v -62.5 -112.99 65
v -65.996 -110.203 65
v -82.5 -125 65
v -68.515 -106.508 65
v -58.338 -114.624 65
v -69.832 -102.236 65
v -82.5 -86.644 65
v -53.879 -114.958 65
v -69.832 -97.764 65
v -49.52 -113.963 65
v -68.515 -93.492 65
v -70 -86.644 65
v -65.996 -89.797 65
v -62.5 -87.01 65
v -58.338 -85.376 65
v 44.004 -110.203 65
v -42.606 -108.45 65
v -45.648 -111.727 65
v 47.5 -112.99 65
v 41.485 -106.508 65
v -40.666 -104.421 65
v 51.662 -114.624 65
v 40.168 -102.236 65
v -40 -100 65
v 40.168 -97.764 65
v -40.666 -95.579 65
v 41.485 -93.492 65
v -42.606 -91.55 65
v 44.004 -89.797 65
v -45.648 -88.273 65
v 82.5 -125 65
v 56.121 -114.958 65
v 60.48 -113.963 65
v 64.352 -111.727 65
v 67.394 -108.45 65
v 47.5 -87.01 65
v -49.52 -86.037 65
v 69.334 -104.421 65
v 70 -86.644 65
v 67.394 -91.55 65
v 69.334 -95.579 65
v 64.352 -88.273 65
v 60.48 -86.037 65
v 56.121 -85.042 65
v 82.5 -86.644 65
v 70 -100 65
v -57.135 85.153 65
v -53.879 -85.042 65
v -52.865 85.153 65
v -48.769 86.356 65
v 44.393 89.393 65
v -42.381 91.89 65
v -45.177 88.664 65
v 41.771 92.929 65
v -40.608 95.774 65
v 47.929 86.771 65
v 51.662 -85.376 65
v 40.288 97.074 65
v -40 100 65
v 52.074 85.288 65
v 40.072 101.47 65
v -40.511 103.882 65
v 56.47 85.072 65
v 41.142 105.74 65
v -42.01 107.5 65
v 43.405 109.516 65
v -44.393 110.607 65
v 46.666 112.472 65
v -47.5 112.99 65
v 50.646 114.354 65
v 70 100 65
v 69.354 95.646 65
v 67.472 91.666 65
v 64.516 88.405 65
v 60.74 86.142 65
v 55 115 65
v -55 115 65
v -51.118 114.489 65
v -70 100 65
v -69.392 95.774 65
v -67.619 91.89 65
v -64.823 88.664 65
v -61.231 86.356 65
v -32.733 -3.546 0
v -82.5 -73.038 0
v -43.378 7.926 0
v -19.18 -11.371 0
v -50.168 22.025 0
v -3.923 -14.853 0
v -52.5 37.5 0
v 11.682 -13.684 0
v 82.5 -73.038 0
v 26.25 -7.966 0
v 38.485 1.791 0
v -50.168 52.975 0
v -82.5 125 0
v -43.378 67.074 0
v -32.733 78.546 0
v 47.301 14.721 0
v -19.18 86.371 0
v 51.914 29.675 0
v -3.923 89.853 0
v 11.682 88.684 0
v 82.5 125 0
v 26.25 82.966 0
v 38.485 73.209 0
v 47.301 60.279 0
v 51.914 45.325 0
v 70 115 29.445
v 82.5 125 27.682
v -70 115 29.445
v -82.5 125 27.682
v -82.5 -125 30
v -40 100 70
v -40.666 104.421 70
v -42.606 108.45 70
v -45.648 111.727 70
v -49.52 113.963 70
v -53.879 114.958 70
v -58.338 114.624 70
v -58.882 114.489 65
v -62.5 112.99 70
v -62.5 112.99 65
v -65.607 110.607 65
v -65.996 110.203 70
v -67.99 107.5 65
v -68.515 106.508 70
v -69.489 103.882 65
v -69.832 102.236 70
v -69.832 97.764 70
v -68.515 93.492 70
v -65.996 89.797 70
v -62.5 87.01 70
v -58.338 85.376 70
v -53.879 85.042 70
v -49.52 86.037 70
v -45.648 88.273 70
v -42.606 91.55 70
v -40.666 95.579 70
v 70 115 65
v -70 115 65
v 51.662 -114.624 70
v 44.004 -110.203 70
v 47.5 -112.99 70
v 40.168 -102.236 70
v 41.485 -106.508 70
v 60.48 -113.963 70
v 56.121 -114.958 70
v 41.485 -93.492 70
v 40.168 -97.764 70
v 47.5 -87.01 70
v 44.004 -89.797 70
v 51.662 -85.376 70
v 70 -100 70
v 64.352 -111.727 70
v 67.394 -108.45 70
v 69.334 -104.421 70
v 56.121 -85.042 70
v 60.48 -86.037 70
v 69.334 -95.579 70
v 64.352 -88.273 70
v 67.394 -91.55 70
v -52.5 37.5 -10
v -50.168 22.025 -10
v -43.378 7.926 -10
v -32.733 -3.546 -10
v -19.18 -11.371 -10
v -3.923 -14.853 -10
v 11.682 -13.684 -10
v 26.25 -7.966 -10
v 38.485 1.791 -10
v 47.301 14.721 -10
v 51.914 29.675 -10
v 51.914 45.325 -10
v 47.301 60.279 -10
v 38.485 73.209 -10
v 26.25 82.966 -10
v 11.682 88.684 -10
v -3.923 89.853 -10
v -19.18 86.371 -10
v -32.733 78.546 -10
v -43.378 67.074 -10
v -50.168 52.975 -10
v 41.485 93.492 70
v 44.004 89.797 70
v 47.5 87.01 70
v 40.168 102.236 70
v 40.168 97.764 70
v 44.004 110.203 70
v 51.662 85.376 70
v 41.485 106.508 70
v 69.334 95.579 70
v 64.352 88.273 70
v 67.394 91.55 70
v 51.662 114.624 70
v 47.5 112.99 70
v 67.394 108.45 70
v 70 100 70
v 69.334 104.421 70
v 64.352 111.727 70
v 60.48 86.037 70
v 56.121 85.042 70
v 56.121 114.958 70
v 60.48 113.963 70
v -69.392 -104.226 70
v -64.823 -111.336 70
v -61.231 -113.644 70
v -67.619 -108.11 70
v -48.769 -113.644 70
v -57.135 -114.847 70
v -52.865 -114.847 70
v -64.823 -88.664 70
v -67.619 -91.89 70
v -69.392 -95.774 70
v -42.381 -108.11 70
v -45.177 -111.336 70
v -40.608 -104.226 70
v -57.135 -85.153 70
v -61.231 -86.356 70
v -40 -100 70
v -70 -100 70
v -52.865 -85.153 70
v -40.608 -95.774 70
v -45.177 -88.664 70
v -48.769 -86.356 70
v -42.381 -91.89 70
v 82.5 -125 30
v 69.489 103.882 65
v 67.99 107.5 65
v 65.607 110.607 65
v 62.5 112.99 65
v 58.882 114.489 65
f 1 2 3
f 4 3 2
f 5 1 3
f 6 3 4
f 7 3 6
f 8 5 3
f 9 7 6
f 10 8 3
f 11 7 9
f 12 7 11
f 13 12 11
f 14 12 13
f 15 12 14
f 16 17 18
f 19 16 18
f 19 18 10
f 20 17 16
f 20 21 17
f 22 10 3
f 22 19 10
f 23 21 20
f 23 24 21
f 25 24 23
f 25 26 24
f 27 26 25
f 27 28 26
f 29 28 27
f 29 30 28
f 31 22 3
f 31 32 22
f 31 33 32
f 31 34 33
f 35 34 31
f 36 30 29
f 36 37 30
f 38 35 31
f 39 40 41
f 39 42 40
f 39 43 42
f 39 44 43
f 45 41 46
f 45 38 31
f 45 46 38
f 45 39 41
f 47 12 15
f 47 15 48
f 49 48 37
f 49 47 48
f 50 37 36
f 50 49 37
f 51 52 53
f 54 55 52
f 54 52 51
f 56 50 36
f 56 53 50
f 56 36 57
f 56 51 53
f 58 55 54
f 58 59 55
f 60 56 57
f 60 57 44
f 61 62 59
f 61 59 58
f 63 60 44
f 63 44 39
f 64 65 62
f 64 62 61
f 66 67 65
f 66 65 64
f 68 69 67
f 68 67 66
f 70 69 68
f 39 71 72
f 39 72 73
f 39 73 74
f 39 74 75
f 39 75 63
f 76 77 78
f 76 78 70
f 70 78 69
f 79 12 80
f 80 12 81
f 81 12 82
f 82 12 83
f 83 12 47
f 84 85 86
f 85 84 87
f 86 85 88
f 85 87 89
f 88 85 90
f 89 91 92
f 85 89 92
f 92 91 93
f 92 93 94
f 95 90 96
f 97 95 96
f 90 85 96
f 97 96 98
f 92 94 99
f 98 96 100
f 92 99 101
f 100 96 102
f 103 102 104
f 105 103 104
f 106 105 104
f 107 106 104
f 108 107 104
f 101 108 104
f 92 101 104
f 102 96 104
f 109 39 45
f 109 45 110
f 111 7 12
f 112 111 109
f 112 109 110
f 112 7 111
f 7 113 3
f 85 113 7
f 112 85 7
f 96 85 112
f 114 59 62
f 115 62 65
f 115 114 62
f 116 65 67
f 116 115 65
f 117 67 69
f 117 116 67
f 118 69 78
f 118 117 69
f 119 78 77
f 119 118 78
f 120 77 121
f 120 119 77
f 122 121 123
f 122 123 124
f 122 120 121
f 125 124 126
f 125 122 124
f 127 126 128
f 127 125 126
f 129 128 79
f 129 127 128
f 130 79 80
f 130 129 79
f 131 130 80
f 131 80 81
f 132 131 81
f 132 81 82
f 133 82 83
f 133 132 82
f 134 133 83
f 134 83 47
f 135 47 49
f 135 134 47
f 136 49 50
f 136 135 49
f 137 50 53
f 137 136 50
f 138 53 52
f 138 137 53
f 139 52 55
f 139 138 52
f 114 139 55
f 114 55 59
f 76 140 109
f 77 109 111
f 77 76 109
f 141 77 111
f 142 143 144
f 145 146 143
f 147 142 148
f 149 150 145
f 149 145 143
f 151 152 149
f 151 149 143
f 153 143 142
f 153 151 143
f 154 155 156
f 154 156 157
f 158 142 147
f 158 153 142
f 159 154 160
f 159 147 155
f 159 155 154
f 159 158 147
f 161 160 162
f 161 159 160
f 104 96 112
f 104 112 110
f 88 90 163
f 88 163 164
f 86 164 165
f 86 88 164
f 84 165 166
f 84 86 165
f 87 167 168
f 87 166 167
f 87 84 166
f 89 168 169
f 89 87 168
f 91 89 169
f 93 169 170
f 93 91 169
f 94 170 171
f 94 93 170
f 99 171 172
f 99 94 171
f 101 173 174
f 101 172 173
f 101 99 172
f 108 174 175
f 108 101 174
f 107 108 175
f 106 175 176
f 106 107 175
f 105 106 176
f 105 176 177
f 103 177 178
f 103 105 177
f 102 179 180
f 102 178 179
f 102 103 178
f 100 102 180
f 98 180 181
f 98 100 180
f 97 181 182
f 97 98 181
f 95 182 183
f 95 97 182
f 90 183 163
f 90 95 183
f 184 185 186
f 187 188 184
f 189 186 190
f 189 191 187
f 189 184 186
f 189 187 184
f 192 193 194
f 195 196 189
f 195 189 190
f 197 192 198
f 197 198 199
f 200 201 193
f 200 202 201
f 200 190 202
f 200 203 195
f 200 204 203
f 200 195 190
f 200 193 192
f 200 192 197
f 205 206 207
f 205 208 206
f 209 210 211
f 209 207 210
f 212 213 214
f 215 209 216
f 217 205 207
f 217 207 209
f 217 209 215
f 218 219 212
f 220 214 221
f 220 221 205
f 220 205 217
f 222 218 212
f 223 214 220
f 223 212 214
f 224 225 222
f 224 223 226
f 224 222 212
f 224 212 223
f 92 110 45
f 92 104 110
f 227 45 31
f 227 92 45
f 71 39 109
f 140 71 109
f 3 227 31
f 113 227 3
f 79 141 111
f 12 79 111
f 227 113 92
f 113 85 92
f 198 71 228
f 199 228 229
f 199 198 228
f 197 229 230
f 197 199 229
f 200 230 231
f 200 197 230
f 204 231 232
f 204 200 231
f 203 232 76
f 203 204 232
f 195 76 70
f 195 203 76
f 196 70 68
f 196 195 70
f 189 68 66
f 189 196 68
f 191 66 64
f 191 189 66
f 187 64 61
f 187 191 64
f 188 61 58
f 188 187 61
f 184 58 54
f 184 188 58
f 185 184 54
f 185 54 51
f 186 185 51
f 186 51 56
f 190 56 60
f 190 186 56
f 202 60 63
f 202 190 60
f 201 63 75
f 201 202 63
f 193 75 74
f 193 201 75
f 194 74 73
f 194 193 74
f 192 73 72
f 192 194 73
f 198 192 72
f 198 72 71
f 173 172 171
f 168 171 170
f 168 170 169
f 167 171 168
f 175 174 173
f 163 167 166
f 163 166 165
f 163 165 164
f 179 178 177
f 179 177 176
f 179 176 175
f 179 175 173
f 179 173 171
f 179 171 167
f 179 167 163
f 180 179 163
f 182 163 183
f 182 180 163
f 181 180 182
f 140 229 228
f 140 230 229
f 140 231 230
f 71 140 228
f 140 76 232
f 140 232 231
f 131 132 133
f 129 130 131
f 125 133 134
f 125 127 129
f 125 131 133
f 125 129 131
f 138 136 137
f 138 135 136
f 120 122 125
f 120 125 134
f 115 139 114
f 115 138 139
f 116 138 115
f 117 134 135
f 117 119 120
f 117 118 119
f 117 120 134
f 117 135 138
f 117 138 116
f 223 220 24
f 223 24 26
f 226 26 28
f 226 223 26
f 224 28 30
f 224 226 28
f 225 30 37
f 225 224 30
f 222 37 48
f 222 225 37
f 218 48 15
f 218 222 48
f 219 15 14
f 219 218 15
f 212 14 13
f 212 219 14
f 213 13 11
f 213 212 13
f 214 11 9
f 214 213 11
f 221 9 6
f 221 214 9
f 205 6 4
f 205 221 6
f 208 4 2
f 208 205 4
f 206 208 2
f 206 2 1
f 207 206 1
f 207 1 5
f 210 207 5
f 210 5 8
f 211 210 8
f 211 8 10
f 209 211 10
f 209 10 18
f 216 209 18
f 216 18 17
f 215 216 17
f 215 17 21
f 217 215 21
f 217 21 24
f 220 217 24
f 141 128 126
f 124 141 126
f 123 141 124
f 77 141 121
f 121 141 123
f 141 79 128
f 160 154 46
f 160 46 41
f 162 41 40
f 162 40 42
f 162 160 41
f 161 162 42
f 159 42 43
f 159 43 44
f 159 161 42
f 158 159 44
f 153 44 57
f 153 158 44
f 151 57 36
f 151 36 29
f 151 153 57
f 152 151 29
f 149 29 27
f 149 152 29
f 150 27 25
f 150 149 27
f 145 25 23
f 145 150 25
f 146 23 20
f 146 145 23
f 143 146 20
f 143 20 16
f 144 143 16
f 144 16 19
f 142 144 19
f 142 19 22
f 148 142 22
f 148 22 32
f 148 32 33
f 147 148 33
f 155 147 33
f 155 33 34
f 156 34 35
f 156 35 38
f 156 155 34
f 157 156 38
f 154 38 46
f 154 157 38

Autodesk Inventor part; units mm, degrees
ref_plane "YZ Plane" through (0, 0, 0) normal (1, 0, 0) x (0, 1, 0)
ref_plane "XZ Plane" through (0, 0, 0) normal (0, 1, 0) x (-1, 0, 0)
ref_plane "XY Plane" through (0, 0, 0) normal (0, 0, 1) x (1, 0, 0)
sketch "Skizze1" plane through (0, 0, 0) normal (0, 0, 1) x (1, 0, 0)
  line L0 (-82.5, 125) -> (82.5, 125)
  line L1 (82.5, 125) -> (82.5, -125)
  line L2 (82.5, -125) -> (-82.5, -125)
  line L3 (-82.5, -125) -> (-82.5, 125)
  line L4 (-82.5, 125) -> (82.5, -125) construction
  line L5 (82.5, 125) -> (-82.5, -125) construction
  point P0 (0, 0)
  dimension "d0" = 165
  dimension "d1" = 250
extrude "Extrusion1" add sketch "Skizze1" along normal blind 70
sketch "Skizze2" plane through (0, 0, 0) normal (0, 0, -1) x (-1, 0, 0)
  line L0 (82.5, 125) -> (-82.5, 125) projected
  circle A0 centre (0, 37.5) radius 52.5
  point P0 (0, 0)
  dimension "d4" = 105
  dimension "d5" = 35
extrude "Extrusion2" add sketch "Skizze2" along normal blind 10
chamfer "Fase1" distance 30 angle 60 1 edges at (0, -125, 0) measured on face at (27.5, -125, 23.3333)
sketch "Skizze3" plane through (0, 0, 70) normal (0, 0, 1) x (1, 0, 0)
  line L0 (82.5, 125) -> (-82.5, 125) projected
  line L1 (-82.5, 125) -> (-82.5, -125) projected
  line L2 (-82.5, -125) -> (82.5, -125) projected
  line L3 (82.5, -125) -> (82.5, 125) projected
  line L4 (-82.5, -115) -> (82.5, -115)
  point P0 (0, 0)
  dimension "d11" = 10
ref_plane "Arbeitsebene1" through (-82.5, -115, 70) normal (0, 0.1736, 0.9848) x (1, 0, 0)
sketch "Skizze4" plane through (0, 0, 70) normal (0, 0, 1) x (1, 0, 0)
  line L0 (82.5, 125) -> (-82.5, 125) projected
  line L1 (-82.5, 125) -> (-82.5, -125) projected
  line L2 (82.5, -125) -> (82.5, 125) projected
  line L3 (-70, -115) -> (70, -115) construction
  line L4 (70, -115) -> (70, 115)
  line L5 (70, 115) -> (-70, 115)
  line L6 (-70, 115) -> (-70, -115)
  line L7 (-70, -115) -> (70, 115) construction
  line L8 (70, -115) -> (-70, 115) construction
  line L9 (-82.5, -115) -> (82.5, -115) projected
  point P0 (0, 0)
  point P1 (0, 0)
  point P2 (0, 0)
  dimension "d13" = 230
  dimension "d14" = 140
extrude "Extrusion3" cut sketch "Skizze4" against normal up to surface contours L2 L9 L4 L5 L6 L1 L0 surface through (-82.5, -115, 70) normal (0, 0.1736, 0.9848)
sketch "Skizze5" plane through (0, 0, 70) normal (0, 0, 1) x (1, 0, 0)
  line L0 (82.5, -115) -> (70, -115) projected
  line L1 (70, -115) -> (70, 115) projected
  line L2 (70, 115) -> (-70, 115) projected
  line L3 (-70, 115) -> (-70, -115) projected
  line L4 (-70, -115) -> (-82.5, -115) projected
  line L5 (-82.5, -115) -> (-82.5, -125) projected
  line L6 (-82.5, -125) -> (82.5, -125) projected
  line L7 (82.5, -125) -> (82.5, -115) projected
  line L8 (55, 100) -> (-55, 100) construction
  line L9 (-55, 100) -> (-55, -100) construction
  line L10 (-55, -100) -> (55, -100) construction
  line L11 (55, -100) -> (55, 100) construction
  line L12 (55, 100) -> (-55, -100) construction
  line L13 (-55, 100) -> (55, -100) construction
  circle A0 centre (-55, -100) radius 15
  circle A1 centre (-55, 100) radius 15
  circle A2 centre (55, 100) radius 15
  circle A3 centre (55, -100) radius 15
  line L14 (-82.5, -115) -> (-82.5, 125) projected
  line L15 (-70, -115) -> (-82.5, -115) projected
  line L16 (-70, 115) -> (-70, -115) projected
  line L17 (70, 115) -> (-70, 115) projected
  line L18 (70, -115) -> (70, 115) projected
  line L19 (82.5, -115) -> (70, -115) projected
  line L20 (82.5, 125) -> (82.5, -115) projected
  line L21 (-82.5, 125) -> (82.5, 125) projected
  point P0 (0, 0)
  dimension "d17" = 110
  dimension "d18" = 200
  dimension "d19" = 30
extrude "Extrusion4" cut sketch "Skizze5" against normal blind 5 contours L7 L6 L5 L4 L3 A1 L2 A2 L1 L0 | L0 L1 L2 L3 L4 L14 L21 L20 | A2 L2 L1 | A1 L3 L2
properties part number "Scale" material "Blei"
